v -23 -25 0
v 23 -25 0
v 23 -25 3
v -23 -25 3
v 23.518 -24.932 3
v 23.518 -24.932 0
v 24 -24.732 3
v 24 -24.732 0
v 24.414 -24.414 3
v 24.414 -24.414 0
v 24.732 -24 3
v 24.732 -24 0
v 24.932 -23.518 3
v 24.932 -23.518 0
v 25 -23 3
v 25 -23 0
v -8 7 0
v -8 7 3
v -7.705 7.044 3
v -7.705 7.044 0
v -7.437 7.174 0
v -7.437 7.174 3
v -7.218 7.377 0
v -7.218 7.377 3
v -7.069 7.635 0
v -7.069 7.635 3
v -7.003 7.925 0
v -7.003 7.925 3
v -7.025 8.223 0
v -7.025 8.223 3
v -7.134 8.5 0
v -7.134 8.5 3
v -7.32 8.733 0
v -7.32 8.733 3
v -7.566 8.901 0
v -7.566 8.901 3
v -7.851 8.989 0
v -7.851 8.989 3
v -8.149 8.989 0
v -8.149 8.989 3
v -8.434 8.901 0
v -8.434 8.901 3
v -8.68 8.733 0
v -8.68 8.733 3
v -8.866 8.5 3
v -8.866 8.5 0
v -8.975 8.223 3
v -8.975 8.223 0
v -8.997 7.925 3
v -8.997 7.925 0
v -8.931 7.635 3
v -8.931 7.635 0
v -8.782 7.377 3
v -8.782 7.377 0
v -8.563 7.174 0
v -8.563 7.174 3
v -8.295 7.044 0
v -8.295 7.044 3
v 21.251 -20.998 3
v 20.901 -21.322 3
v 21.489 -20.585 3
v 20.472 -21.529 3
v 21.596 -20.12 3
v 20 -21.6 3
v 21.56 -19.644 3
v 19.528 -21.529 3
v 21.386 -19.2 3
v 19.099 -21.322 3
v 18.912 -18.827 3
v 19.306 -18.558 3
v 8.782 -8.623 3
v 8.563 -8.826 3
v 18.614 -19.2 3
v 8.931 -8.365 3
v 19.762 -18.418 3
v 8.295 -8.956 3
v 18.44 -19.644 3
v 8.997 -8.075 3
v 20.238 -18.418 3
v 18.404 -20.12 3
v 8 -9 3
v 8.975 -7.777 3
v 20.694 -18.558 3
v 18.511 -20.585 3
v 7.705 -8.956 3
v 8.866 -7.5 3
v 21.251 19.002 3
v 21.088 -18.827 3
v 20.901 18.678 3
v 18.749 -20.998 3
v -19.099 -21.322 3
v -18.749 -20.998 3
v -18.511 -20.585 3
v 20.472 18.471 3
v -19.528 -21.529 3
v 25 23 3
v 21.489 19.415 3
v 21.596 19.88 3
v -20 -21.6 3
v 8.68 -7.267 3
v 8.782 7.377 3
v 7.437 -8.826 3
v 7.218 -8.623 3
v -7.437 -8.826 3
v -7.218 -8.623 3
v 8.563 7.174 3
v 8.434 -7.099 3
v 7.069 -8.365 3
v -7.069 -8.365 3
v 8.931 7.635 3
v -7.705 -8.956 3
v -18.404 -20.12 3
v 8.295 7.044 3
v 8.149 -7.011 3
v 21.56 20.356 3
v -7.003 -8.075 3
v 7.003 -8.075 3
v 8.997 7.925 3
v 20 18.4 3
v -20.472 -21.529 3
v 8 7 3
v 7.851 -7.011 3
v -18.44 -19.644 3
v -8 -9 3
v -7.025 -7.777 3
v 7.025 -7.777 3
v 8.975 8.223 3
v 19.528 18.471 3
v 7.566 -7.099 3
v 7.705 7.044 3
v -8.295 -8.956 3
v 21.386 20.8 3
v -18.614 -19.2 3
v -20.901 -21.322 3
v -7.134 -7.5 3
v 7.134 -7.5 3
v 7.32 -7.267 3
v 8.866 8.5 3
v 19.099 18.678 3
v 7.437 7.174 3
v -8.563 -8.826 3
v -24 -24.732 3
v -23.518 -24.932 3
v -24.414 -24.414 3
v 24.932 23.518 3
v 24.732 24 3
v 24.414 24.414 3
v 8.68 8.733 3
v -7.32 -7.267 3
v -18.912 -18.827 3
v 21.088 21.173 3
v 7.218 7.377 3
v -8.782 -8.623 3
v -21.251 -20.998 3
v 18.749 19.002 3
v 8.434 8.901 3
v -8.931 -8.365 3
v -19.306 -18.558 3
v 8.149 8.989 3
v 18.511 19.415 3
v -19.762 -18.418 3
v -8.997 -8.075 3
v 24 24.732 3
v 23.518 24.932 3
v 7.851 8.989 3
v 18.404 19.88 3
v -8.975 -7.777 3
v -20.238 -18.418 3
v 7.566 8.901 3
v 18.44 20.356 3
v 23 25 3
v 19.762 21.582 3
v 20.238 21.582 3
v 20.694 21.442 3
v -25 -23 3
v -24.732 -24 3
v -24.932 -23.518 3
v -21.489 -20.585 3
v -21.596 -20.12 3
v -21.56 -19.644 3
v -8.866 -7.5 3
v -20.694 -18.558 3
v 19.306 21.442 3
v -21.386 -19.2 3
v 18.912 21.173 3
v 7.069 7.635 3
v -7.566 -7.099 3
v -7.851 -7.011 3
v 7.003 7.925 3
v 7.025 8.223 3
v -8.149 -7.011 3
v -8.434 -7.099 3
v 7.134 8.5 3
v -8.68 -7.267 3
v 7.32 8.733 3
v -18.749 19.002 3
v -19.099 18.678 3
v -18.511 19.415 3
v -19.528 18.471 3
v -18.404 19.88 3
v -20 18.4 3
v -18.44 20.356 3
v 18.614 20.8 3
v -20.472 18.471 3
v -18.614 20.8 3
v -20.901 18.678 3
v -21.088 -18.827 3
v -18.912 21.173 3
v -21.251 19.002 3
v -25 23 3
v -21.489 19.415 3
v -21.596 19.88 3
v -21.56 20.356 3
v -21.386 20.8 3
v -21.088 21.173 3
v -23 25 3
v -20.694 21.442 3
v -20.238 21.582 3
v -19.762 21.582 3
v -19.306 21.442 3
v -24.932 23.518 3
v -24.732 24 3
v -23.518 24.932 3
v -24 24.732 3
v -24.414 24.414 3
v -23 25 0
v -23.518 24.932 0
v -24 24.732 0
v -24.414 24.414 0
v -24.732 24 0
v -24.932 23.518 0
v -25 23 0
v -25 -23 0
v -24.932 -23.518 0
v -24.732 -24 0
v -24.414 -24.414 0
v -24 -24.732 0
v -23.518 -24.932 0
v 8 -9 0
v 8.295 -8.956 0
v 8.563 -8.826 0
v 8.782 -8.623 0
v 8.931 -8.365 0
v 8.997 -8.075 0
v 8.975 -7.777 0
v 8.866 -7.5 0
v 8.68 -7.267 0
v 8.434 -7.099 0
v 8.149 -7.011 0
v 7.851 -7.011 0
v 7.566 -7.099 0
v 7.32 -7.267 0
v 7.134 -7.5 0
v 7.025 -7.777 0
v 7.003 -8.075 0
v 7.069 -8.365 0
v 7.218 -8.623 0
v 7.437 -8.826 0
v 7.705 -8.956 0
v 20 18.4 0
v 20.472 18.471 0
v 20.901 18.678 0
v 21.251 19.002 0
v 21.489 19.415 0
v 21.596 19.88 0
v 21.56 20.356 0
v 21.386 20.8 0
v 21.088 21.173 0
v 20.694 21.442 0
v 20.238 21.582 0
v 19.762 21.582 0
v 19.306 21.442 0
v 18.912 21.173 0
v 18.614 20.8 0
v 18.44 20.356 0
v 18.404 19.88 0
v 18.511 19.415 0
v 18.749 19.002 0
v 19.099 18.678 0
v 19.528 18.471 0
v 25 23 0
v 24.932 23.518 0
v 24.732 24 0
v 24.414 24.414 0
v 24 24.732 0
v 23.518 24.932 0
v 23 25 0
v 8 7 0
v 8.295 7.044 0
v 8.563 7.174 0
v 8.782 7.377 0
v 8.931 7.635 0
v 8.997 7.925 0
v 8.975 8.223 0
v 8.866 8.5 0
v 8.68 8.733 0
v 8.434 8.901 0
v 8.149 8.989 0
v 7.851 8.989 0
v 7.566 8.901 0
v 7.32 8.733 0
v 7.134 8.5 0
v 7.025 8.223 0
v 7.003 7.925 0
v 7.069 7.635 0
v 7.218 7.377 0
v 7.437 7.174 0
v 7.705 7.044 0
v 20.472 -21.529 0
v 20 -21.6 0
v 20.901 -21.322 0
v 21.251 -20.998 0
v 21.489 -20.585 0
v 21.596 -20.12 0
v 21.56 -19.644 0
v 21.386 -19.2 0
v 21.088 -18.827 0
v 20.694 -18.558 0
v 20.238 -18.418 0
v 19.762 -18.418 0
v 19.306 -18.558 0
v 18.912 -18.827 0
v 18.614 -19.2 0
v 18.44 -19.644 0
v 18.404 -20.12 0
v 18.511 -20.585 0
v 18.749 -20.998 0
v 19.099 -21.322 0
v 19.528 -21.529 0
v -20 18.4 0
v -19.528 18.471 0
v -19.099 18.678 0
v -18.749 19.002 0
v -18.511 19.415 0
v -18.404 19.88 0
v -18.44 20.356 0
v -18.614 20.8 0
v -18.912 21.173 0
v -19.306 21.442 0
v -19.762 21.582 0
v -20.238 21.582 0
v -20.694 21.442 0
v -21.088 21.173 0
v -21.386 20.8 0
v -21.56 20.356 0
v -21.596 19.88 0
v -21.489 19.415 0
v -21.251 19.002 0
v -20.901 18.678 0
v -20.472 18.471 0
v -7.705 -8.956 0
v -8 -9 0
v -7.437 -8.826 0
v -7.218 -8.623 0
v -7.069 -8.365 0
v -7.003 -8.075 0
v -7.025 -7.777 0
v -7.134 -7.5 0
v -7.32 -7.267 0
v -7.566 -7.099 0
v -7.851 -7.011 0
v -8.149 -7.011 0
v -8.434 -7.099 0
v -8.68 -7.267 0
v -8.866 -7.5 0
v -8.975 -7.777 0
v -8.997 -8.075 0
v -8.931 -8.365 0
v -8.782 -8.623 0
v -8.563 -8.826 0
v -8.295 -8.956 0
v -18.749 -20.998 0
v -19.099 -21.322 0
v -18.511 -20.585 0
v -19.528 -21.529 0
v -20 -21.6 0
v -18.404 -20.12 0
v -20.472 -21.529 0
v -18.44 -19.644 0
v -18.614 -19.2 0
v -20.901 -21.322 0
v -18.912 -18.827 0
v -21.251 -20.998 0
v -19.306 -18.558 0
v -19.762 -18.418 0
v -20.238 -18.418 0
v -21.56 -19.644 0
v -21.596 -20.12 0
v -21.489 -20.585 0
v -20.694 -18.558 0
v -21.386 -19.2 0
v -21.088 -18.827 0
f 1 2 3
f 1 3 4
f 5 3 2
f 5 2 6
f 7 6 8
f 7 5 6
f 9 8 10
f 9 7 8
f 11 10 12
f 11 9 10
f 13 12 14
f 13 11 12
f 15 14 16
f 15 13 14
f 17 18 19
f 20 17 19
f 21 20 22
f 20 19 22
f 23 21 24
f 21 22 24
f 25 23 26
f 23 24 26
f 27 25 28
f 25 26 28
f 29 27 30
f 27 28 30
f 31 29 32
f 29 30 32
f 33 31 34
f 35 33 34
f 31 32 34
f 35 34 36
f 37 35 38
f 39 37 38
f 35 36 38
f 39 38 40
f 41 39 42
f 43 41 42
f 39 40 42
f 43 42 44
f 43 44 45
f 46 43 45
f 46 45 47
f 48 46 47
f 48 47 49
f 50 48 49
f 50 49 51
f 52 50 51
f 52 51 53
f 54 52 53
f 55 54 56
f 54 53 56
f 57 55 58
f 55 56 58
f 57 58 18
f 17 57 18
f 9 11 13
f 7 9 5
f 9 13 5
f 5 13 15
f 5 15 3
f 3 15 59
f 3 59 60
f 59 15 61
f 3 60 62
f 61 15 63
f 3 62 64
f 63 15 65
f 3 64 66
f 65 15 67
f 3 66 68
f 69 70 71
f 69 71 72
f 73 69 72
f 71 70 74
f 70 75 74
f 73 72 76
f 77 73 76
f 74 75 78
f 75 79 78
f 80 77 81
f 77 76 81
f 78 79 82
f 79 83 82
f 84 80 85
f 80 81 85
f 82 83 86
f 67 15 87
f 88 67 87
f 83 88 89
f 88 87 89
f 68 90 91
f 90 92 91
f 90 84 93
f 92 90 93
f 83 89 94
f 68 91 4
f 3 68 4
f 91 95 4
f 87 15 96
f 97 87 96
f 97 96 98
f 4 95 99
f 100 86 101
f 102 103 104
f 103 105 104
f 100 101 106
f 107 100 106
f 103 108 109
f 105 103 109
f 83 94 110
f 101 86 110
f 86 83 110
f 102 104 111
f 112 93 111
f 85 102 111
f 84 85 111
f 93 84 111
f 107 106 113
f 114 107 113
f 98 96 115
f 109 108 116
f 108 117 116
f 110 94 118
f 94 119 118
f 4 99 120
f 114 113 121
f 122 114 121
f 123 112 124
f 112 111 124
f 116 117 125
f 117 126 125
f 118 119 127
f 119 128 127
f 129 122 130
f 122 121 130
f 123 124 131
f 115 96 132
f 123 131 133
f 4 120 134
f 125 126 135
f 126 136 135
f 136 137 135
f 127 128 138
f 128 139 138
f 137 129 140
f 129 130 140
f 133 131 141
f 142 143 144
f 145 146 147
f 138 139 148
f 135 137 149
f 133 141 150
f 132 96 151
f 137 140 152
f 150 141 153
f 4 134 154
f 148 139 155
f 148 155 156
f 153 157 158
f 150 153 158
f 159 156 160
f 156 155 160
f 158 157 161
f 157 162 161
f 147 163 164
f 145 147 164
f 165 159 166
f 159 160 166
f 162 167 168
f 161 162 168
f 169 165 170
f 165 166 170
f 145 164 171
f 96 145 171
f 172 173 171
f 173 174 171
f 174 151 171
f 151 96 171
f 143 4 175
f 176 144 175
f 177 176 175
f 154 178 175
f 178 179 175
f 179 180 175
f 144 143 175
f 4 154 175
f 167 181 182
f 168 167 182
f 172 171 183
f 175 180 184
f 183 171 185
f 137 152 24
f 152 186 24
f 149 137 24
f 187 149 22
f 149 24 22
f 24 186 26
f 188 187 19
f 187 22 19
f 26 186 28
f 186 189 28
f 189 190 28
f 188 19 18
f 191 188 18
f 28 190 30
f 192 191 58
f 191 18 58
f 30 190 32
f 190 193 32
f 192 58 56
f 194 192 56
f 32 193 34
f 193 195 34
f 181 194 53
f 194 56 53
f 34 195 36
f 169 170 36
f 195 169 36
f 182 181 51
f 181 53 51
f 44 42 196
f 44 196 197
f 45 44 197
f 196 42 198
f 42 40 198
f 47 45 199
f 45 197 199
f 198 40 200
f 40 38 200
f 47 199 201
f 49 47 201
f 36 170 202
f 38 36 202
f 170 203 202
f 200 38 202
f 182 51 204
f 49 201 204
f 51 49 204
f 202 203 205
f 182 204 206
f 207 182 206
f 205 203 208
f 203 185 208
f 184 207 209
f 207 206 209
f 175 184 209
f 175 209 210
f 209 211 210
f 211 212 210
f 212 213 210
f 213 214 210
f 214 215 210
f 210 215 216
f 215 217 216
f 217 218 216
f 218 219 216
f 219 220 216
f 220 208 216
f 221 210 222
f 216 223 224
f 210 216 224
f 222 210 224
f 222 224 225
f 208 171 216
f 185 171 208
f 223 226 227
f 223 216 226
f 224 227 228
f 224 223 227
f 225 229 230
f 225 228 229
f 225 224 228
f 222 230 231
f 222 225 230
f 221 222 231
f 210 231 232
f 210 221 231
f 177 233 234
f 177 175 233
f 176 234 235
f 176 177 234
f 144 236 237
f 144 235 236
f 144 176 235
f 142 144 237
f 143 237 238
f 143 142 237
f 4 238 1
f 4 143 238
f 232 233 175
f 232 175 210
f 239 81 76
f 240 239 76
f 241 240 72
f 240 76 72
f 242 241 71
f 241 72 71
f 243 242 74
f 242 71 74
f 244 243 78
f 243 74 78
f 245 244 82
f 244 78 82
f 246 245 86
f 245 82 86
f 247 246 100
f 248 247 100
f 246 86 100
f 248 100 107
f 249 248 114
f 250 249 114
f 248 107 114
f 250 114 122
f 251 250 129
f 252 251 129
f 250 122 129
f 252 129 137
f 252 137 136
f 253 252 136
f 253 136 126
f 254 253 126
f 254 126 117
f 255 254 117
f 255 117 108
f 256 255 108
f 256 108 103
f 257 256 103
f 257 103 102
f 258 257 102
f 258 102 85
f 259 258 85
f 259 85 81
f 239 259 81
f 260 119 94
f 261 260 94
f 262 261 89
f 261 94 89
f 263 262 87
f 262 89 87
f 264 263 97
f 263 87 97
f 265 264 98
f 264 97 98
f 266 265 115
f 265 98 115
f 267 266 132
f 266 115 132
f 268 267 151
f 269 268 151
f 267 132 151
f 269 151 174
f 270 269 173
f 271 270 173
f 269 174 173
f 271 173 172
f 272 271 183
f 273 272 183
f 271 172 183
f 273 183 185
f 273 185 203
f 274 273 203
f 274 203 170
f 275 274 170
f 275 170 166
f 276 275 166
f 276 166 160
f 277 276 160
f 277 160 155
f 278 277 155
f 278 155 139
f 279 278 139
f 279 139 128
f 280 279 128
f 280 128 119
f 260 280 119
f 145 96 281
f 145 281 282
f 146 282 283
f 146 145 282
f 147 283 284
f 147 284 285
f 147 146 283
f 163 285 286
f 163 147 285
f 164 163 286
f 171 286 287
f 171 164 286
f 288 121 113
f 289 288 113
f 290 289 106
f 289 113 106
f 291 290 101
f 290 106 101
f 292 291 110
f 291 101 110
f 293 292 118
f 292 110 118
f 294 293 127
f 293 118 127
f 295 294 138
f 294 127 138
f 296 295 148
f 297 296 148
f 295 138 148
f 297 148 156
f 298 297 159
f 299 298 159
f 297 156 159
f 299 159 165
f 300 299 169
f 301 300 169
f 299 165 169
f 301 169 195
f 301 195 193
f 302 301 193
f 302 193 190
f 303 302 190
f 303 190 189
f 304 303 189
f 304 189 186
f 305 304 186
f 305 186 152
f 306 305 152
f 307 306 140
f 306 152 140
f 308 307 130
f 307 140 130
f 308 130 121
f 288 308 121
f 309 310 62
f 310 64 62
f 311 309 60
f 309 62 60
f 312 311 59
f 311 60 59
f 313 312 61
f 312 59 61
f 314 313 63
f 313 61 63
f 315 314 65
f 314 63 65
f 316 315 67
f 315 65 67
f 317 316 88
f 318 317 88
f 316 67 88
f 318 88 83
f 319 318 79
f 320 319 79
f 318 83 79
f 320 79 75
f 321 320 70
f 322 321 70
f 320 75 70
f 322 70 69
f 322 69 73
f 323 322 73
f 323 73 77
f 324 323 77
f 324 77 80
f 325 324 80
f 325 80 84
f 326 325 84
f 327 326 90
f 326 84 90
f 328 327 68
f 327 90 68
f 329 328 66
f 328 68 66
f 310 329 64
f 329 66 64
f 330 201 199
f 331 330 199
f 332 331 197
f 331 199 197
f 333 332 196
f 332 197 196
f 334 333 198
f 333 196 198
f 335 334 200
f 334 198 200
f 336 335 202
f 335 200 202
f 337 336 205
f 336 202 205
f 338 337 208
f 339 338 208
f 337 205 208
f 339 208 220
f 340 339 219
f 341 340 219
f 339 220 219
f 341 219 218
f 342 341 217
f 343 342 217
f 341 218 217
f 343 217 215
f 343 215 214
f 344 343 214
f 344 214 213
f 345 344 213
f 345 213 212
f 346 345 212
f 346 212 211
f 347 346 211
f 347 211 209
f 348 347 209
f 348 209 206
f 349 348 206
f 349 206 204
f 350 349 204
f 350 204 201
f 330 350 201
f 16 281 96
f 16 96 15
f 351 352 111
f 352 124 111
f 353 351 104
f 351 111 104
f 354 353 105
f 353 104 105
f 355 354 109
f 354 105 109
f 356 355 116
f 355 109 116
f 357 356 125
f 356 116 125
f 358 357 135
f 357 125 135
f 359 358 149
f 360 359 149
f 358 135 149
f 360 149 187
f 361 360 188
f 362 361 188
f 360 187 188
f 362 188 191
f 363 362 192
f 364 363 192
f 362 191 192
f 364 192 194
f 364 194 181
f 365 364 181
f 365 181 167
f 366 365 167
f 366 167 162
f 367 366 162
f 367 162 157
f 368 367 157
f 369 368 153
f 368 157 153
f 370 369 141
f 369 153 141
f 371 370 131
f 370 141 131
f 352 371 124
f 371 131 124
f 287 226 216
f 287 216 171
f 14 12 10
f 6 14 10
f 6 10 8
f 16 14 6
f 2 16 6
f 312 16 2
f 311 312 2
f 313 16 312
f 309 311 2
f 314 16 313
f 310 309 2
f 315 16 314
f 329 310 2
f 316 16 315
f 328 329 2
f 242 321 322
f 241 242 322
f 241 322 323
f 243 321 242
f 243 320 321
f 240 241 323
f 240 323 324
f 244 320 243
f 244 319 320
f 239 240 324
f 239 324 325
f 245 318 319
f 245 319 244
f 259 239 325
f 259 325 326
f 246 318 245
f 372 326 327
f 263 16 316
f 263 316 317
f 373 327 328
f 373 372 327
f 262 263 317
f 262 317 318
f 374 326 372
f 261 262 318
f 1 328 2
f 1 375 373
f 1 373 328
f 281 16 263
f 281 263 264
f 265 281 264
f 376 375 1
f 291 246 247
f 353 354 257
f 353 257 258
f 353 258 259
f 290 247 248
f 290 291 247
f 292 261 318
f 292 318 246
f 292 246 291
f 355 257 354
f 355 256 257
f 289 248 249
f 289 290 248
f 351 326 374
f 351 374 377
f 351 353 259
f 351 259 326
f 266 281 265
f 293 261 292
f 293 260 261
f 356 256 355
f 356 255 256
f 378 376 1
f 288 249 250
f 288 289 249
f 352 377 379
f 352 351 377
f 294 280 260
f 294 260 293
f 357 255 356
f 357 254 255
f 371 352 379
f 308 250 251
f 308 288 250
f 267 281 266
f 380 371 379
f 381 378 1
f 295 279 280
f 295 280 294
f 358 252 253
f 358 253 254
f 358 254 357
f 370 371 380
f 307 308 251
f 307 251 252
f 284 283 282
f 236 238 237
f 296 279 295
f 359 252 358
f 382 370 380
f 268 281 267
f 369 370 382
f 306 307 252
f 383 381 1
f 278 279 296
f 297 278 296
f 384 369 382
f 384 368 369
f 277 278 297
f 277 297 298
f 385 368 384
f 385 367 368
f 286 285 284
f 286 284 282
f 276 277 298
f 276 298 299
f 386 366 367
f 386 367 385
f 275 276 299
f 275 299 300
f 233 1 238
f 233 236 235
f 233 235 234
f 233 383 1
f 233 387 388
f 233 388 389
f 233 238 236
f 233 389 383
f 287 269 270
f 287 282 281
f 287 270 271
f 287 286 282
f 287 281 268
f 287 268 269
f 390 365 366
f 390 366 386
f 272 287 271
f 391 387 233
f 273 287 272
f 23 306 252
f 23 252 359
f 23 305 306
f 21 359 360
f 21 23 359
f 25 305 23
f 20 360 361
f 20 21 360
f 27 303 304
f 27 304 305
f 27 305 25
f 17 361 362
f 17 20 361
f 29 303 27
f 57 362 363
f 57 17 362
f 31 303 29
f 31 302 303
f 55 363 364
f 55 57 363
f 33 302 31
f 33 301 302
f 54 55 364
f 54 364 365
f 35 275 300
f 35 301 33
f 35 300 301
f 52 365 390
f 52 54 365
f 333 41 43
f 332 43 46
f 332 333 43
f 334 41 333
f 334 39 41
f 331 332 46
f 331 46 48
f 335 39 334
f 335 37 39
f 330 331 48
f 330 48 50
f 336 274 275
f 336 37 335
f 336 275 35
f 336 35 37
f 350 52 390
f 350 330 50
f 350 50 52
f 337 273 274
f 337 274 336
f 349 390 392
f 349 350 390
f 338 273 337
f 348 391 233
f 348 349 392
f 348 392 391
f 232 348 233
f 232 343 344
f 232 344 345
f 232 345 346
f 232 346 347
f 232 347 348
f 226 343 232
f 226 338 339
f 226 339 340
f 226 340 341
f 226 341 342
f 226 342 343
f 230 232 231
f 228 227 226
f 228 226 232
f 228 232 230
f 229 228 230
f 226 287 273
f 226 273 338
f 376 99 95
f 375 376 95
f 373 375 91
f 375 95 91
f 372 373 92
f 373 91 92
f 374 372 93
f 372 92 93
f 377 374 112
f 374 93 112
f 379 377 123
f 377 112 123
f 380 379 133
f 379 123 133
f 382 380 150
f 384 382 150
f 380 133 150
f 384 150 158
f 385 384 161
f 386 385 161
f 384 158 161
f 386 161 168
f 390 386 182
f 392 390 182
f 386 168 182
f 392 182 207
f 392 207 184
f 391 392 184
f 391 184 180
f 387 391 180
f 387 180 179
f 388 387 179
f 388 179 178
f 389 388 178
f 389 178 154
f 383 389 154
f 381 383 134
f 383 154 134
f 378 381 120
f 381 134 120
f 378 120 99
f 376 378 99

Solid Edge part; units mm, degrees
sketch "Sketch1" plane through (0, 0, 0) normal (0, 0, 1) x (1, 0, 0)
  line L0 (25, -25) -> (-25, -25)
  line L1 (-25, -25) -> (-25, 25)
  line L2 (-25, 25) -> (25, 25)
  line L3 (25, 25) -> (25, -25)
  dimension "D1" = 50
  dimension "D2" = 50
extrude "Protrusion1" add sketch "Sketch1" along normal blind 3
hole "Hole_1" at (-8, 8, 3) direction (0, 0, -1) diameter 2 end through all
hole "Hole1" at (-8, -8, 3) direction (0, 0, -1) diameter 2 end through all
hole "Hole2" at (8, -8, 3) direction (0, 0, -1) diameter 2 end through all
hole "Hole3" at (8, 8, 3) direction (0, 0, -1) diameter 2 end through all
hole "Hole_5" at (20, 20, 3) direction (0, 0, -1) diameter 3.2 end through all
hole "Hole4" at (20, -20, 3) direction (0, 0, -1) diameter 3.2 end through all
hole "Hole5" at (-20, -20, 3) direction (0, 0, -1) diameter 3.2 end through all
hole "Hole6" at (-20, 20, 3) direction (0, 0, -1) diameter 3.2 end through all
fillet "Round_1" radius 2 4 edges at (-25, -25, 1.5) (25, -25, 1.5) (-25, 25, 1.5) (25, 25, 1.5)
properties material "木材, アッシュ"
